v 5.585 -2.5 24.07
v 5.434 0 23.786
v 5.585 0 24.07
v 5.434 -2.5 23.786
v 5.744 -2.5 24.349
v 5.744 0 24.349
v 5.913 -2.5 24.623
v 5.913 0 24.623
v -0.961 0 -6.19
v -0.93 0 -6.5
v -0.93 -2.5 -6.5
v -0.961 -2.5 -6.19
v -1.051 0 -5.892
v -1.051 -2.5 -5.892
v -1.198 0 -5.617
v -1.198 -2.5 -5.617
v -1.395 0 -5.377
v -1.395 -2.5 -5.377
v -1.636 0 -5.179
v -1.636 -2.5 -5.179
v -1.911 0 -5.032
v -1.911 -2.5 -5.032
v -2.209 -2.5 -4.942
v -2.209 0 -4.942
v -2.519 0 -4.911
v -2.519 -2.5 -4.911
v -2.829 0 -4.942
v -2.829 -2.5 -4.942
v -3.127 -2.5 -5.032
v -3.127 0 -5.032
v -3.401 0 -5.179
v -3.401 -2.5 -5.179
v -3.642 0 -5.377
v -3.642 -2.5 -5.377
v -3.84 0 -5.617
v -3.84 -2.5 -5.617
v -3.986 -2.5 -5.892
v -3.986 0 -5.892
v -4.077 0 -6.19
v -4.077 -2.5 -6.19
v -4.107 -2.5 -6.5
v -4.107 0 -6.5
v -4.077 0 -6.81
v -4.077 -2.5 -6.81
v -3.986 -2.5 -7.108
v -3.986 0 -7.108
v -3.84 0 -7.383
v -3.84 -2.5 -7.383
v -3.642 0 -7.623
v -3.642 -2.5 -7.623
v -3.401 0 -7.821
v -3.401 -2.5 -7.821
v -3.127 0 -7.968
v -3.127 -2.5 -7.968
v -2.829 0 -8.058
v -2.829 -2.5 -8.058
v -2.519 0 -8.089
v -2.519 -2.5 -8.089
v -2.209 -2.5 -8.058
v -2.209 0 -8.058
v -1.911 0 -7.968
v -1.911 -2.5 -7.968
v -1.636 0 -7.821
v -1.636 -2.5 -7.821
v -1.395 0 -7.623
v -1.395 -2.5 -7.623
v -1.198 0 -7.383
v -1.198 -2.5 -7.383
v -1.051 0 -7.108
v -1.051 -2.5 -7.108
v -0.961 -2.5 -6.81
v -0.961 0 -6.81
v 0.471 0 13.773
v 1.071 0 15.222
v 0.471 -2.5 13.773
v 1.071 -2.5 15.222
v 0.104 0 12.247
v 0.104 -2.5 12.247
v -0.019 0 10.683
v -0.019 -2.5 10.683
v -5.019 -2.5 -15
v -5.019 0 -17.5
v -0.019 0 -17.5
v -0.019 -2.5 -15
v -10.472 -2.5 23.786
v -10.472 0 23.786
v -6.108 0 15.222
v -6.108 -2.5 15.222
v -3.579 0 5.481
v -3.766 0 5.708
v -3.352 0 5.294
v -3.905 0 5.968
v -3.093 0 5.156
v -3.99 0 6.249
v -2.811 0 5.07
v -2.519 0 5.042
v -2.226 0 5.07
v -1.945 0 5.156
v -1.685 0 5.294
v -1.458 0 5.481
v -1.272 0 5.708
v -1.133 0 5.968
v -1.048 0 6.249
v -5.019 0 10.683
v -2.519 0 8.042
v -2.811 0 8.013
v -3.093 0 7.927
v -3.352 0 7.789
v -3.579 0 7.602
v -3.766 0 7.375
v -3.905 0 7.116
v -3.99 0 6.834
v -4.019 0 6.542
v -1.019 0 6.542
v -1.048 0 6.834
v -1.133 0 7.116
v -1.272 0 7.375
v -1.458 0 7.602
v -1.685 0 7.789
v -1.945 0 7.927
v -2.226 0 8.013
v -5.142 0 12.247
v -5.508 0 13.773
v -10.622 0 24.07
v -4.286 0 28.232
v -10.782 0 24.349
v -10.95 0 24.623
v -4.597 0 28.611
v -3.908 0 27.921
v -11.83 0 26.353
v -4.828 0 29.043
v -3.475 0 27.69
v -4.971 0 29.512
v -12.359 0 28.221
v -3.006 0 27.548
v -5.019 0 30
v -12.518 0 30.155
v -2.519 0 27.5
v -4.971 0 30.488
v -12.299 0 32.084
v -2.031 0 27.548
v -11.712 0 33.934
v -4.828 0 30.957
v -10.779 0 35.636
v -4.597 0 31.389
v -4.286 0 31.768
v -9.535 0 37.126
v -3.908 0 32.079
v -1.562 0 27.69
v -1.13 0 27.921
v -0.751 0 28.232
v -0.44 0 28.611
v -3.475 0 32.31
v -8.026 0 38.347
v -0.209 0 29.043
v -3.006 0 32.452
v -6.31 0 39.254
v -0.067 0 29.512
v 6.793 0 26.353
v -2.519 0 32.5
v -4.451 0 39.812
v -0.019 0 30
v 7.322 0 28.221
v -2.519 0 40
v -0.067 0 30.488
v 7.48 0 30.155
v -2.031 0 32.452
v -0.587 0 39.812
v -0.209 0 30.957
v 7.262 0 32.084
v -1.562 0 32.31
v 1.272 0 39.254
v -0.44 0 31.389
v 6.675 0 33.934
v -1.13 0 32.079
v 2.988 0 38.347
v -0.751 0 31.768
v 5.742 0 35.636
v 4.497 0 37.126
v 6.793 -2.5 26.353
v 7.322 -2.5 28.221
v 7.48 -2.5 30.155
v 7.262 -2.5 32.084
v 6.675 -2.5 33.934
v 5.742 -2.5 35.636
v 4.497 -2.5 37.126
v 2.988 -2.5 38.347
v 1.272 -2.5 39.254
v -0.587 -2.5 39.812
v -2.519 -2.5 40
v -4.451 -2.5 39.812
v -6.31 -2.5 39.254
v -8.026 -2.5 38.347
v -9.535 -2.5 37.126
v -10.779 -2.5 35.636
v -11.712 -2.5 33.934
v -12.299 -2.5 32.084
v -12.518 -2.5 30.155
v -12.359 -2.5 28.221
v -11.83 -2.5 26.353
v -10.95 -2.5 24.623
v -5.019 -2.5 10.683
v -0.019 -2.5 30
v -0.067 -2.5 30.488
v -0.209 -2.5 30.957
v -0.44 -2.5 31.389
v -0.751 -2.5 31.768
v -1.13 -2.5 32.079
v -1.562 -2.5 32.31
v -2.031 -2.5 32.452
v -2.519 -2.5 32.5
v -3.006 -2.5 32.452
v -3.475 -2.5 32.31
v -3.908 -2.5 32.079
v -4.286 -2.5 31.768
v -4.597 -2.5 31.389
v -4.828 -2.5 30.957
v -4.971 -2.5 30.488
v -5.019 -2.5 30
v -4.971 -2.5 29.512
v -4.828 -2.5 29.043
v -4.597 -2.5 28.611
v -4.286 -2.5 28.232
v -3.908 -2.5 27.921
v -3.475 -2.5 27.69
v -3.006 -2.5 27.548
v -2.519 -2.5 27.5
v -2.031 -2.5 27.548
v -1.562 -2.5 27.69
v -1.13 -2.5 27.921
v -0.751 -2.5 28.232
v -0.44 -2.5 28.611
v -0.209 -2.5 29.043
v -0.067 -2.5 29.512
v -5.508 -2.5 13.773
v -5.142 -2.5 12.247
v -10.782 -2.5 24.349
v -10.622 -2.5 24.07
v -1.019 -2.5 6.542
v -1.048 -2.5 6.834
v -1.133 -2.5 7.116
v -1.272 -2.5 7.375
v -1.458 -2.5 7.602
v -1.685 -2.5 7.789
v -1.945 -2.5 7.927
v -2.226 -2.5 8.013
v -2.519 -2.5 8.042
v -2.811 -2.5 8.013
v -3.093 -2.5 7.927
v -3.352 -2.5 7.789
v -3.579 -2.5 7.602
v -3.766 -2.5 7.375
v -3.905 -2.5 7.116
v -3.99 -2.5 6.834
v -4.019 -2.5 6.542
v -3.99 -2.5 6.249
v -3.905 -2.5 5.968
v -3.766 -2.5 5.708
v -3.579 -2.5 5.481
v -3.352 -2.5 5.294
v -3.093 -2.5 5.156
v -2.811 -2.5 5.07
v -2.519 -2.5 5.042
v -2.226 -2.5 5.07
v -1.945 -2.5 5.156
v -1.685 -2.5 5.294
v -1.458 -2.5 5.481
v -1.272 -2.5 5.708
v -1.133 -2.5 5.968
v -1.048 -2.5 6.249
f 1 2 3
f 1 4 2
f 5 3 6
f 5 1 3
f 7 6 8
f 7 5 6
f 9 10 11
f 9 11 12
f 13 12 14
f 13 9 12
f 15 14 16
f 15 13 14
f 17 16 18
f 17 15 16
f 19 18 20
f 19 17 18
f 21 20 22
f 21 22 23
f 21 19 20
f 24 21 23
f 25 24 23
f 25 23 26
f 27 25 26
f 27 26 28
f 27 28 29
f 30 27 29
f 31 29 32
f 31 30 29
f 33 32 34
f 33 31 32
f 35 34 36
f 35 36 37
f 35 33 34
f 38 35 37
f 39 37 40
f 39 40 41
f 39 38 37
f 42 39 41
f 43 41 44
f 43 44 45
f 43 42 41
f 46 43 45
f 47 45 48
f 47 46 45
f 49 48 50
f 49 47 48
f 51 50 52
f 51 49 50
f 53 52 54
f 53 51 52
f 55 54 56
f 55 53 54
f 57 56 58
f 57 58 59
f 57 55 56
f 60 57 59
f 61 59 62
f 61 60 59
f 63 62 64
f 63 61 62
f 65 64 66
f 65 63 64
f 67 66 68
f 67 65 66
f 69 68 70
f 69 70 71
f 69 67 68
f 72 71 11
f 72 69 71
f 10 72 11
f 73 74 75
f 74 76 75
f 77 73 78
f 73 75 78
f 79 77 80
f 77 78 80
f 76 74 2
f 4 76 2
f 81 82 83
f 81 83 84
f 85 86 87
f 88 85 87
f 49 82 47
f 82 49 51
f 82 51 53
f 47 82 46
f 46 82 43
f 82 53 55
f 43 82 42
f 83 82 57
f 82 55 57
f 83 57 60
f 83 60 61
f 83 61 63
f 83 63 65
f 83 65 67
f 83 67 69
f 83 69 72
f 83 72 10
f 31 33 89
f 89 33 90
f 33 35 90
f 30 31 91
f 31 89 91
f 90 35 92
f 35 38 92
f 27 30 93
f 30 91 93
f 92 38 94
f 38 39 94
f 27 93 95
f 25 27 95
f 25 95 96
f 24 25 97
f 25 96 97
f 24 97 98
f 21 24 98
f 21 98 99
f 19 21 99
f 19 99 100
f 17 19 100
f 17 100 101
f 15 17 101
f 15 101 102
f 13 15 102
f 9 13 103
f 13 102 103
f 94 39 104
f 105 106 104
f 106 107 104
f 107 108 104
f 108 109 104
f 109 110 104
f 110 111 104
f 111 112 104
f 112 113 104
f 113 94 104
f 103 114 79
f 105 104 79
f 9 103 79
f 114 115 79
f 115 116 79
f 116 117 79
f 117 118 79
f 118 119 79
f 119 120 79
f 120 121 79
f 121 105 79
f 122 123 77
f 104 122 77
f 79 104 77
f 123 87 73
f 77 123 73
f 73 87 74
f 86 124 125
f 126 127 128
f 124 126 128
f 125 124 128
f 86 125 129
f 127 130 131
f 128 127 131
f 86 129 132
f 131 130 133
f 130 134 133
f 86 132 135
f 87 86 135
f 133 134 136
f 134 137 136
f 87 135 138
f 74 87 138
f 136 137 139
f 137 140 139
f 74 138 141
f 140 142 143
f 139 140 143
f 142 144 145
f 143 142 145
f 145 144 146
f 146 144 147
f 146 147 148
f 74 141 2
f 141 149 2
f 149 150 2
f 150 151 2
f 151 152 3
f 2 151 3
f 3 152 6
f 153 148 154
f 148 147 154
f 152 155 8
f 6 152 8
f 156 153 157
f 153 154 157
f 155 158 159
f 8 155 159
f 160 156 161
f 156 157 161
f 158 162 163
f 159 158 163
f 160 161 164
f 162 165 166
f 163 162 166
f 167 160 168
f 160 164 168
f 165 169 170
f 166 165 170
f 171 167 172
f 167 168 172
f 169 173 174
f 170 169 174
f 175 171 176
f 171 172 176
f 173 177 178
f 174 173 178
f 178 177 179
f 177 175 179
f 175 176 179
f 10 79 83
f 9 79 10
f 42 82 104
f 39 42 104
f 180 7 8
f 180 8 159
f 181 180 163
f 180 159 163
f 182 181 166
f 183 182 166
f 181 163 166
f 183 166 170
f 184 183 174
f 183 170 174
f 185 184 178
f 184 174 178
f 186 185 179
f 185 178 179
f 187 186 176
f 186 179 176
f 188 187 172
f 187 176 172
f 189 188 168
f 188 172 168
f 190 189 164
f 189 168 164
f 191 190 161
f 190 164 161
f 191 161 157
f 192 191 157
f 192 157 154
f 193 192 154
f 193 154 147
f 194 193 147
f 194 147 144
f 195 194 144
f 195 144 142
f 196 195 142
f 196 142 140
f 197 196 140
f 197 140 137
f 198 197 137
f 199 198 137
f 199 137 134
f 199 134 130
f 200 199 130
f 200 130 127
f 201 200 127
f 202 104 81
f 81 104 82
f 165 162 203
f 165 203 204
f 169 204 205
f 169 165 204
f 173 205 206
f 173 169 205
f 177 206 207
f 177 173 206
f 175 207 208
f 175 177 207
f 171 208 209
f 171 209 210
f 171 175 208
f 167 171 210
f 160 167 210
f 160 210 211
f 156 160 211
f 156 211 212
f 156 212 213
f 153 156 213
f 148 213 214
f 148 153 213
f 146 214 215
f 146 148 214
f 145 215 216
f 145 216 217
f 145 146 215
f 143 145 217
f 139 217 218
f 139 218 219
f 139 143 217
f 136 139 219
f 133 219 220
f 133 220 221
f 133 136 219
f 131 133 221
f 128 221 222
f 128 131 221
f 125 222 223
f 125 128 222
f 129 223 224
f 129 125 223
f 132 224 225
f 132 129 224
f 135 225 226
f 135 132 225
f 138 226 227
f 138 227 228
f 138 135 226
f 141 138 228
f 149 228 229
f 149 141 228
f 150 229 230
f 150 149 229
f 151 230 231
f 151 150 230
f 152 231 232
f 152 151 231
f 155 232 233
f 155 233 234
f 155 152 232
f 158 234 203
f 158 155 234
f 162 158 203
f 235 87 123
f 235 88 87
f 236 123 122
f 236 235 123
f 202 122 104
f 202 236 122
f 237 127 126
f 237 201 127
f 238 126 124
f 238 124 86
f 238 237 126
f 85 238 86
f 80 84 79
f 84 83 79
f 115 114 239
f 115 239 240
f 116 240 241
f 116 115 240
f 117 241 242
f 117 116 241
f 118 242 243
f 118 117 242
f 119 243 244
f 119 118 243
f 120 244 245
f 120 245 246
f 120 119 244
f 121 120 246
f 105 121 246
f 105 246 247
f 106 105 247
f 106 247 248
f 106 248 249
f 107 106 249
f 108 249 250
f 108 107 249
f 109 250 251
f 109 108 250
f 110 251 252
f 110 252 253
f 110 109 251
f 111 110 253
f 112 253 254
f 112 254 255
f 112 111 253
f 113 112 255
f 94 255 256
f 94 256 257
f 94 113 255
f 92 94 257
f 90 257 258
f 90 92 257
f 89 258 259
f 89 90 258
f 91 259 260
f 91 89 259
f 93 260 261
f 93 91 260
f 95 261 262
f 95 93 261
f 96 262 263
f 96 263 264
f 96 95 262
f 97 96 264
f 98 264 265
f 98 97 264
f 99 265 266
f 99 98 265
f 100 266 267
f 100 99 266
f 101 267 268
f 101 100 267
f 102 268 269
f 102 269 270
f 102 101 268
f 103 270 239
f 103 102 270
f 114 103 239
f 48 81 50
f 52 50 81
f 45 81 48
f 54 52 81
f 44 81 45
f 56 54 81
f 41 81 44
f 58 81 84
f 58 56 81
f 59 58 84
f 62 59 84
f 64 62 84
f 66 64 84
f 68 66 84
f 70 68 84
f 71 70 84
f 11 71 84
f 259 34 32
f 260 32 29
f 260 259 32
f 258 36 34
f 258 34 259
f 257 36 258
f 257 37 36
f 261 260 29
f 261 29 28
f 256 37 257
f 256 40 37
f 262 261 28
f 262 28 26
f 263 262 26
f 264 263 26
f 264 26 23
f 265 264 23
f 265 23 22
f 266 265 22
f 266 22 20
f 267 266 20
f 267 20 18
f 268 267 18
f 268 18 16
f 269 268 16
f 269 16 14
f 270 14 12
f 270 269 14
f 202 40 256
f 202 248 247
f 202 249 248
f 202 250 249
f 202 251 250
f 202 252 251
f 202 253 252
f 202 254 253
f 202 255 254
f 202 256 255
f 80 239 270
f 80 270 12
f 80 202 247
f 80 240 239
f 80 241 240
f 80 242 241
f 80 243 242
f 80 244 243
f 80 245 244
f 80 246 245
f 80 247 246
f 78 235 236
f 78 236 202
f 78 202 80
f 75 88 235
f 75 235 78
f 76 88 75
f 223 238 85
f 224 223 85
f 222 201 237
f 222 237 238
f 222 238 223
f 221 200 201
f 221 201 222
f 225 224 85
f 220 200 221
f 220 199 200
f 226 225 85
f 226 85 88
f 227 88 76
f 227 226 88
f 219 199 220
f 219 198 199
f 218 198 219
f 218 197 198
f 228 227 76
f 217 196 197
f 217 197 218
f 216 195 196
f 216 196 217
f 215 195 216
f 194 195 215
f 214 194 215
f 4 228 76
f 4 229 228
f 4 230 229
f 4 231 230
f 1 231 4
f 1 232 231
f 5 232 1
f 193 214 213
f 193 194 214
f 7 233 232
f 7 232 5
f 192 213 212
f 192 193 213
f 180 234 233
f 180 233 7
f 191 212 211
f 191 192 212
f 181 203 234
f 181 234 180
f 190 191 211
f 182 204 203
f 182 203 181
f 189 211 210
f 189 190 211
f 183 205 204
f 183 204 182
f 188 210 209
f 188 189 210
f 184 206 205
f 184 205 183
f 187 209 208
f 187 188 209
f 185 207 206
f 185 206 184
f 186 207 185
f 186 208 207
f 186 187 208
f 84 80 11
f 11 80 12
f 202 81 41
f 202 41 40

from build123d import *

# Parameters (mm, degrees)
F0_R        = 1.5
F0_R_2      = 1.5885930288
F0_R_3      = 2.5
F1_DEPTH    = 2.5
F2_T1_DEPTH = 30.7168298797
F3_R        = 10


# Not quite as in the source:
# - a fillet or chamfer that OpenCascade refuses, or shapes differently, is made with other operations: its cross-section is extruded or revolved along the edge and cut away or added


with BuildPart() as f1:
    # F0 (on Front) → F1 (new body)
    with BuildSketch(Plane.XZ):
        with BuildLine():
            Line((-0.0187197208, 13.0832688883), (5.6909857328, 24.2902945465))
            ThreePointArc((5.6909857328, 24.2902945465), (-2.5187197208, 40), (-10.7284251743, 24.2902945465))
            Line((-10.7284251743, 24.2902945465), (-5.0187197208, 13.0832688883))
            Line((-5.0187197208, 13.0832688883), (-5.0187197208, -20))
            Line((-5.0187197208, -20), (-0.0187197208, -20))
            Line((-0.0187197208, -20), (-0.0187197208, 13.0832688883))
        make_face()
        with Locations((-2.5187197208, 6.5416344441)):
            Circle(F0_R, mode=Mode.SUBTRACT)
        with Locations((-2.5187197208, -6.5)):
            Circle(F0_R_2, mode=Mode.SUBTRACT)
        with Locations((-2.5187197208, 30)):
            Circle(F0_R_3, mode=Mode.SUBTRACT)
    extrude(amount=F1_DEPTH)

    # F2: chamfer of 5 on 1 edges, made by hand

    # F2_s2 → F2_t1 (cut)
    with BuildSketch(Plane.YZ.offset(-17.8771346606)):
        Polygon((2.5, -20), (-2.5, -15), (-2.5, -20), align=None)
    extrude(amount=F2_T1_DEPTH, mode=Mode.SUBTRACT)

    # F3
    f3_edges = [f1.edges().sort_by_distance(p)[0] for p in [
        (-0.01872, -1.25, 13.083269),
        (-5.01872, -1.25, 13.083269),
        (5.690986, -1.25, 24.290295),
        (-10.728425, -1.25, 24.290295),
    ]]
    fillet(f3_edges, radius=F3_R)


solid = f1.part
